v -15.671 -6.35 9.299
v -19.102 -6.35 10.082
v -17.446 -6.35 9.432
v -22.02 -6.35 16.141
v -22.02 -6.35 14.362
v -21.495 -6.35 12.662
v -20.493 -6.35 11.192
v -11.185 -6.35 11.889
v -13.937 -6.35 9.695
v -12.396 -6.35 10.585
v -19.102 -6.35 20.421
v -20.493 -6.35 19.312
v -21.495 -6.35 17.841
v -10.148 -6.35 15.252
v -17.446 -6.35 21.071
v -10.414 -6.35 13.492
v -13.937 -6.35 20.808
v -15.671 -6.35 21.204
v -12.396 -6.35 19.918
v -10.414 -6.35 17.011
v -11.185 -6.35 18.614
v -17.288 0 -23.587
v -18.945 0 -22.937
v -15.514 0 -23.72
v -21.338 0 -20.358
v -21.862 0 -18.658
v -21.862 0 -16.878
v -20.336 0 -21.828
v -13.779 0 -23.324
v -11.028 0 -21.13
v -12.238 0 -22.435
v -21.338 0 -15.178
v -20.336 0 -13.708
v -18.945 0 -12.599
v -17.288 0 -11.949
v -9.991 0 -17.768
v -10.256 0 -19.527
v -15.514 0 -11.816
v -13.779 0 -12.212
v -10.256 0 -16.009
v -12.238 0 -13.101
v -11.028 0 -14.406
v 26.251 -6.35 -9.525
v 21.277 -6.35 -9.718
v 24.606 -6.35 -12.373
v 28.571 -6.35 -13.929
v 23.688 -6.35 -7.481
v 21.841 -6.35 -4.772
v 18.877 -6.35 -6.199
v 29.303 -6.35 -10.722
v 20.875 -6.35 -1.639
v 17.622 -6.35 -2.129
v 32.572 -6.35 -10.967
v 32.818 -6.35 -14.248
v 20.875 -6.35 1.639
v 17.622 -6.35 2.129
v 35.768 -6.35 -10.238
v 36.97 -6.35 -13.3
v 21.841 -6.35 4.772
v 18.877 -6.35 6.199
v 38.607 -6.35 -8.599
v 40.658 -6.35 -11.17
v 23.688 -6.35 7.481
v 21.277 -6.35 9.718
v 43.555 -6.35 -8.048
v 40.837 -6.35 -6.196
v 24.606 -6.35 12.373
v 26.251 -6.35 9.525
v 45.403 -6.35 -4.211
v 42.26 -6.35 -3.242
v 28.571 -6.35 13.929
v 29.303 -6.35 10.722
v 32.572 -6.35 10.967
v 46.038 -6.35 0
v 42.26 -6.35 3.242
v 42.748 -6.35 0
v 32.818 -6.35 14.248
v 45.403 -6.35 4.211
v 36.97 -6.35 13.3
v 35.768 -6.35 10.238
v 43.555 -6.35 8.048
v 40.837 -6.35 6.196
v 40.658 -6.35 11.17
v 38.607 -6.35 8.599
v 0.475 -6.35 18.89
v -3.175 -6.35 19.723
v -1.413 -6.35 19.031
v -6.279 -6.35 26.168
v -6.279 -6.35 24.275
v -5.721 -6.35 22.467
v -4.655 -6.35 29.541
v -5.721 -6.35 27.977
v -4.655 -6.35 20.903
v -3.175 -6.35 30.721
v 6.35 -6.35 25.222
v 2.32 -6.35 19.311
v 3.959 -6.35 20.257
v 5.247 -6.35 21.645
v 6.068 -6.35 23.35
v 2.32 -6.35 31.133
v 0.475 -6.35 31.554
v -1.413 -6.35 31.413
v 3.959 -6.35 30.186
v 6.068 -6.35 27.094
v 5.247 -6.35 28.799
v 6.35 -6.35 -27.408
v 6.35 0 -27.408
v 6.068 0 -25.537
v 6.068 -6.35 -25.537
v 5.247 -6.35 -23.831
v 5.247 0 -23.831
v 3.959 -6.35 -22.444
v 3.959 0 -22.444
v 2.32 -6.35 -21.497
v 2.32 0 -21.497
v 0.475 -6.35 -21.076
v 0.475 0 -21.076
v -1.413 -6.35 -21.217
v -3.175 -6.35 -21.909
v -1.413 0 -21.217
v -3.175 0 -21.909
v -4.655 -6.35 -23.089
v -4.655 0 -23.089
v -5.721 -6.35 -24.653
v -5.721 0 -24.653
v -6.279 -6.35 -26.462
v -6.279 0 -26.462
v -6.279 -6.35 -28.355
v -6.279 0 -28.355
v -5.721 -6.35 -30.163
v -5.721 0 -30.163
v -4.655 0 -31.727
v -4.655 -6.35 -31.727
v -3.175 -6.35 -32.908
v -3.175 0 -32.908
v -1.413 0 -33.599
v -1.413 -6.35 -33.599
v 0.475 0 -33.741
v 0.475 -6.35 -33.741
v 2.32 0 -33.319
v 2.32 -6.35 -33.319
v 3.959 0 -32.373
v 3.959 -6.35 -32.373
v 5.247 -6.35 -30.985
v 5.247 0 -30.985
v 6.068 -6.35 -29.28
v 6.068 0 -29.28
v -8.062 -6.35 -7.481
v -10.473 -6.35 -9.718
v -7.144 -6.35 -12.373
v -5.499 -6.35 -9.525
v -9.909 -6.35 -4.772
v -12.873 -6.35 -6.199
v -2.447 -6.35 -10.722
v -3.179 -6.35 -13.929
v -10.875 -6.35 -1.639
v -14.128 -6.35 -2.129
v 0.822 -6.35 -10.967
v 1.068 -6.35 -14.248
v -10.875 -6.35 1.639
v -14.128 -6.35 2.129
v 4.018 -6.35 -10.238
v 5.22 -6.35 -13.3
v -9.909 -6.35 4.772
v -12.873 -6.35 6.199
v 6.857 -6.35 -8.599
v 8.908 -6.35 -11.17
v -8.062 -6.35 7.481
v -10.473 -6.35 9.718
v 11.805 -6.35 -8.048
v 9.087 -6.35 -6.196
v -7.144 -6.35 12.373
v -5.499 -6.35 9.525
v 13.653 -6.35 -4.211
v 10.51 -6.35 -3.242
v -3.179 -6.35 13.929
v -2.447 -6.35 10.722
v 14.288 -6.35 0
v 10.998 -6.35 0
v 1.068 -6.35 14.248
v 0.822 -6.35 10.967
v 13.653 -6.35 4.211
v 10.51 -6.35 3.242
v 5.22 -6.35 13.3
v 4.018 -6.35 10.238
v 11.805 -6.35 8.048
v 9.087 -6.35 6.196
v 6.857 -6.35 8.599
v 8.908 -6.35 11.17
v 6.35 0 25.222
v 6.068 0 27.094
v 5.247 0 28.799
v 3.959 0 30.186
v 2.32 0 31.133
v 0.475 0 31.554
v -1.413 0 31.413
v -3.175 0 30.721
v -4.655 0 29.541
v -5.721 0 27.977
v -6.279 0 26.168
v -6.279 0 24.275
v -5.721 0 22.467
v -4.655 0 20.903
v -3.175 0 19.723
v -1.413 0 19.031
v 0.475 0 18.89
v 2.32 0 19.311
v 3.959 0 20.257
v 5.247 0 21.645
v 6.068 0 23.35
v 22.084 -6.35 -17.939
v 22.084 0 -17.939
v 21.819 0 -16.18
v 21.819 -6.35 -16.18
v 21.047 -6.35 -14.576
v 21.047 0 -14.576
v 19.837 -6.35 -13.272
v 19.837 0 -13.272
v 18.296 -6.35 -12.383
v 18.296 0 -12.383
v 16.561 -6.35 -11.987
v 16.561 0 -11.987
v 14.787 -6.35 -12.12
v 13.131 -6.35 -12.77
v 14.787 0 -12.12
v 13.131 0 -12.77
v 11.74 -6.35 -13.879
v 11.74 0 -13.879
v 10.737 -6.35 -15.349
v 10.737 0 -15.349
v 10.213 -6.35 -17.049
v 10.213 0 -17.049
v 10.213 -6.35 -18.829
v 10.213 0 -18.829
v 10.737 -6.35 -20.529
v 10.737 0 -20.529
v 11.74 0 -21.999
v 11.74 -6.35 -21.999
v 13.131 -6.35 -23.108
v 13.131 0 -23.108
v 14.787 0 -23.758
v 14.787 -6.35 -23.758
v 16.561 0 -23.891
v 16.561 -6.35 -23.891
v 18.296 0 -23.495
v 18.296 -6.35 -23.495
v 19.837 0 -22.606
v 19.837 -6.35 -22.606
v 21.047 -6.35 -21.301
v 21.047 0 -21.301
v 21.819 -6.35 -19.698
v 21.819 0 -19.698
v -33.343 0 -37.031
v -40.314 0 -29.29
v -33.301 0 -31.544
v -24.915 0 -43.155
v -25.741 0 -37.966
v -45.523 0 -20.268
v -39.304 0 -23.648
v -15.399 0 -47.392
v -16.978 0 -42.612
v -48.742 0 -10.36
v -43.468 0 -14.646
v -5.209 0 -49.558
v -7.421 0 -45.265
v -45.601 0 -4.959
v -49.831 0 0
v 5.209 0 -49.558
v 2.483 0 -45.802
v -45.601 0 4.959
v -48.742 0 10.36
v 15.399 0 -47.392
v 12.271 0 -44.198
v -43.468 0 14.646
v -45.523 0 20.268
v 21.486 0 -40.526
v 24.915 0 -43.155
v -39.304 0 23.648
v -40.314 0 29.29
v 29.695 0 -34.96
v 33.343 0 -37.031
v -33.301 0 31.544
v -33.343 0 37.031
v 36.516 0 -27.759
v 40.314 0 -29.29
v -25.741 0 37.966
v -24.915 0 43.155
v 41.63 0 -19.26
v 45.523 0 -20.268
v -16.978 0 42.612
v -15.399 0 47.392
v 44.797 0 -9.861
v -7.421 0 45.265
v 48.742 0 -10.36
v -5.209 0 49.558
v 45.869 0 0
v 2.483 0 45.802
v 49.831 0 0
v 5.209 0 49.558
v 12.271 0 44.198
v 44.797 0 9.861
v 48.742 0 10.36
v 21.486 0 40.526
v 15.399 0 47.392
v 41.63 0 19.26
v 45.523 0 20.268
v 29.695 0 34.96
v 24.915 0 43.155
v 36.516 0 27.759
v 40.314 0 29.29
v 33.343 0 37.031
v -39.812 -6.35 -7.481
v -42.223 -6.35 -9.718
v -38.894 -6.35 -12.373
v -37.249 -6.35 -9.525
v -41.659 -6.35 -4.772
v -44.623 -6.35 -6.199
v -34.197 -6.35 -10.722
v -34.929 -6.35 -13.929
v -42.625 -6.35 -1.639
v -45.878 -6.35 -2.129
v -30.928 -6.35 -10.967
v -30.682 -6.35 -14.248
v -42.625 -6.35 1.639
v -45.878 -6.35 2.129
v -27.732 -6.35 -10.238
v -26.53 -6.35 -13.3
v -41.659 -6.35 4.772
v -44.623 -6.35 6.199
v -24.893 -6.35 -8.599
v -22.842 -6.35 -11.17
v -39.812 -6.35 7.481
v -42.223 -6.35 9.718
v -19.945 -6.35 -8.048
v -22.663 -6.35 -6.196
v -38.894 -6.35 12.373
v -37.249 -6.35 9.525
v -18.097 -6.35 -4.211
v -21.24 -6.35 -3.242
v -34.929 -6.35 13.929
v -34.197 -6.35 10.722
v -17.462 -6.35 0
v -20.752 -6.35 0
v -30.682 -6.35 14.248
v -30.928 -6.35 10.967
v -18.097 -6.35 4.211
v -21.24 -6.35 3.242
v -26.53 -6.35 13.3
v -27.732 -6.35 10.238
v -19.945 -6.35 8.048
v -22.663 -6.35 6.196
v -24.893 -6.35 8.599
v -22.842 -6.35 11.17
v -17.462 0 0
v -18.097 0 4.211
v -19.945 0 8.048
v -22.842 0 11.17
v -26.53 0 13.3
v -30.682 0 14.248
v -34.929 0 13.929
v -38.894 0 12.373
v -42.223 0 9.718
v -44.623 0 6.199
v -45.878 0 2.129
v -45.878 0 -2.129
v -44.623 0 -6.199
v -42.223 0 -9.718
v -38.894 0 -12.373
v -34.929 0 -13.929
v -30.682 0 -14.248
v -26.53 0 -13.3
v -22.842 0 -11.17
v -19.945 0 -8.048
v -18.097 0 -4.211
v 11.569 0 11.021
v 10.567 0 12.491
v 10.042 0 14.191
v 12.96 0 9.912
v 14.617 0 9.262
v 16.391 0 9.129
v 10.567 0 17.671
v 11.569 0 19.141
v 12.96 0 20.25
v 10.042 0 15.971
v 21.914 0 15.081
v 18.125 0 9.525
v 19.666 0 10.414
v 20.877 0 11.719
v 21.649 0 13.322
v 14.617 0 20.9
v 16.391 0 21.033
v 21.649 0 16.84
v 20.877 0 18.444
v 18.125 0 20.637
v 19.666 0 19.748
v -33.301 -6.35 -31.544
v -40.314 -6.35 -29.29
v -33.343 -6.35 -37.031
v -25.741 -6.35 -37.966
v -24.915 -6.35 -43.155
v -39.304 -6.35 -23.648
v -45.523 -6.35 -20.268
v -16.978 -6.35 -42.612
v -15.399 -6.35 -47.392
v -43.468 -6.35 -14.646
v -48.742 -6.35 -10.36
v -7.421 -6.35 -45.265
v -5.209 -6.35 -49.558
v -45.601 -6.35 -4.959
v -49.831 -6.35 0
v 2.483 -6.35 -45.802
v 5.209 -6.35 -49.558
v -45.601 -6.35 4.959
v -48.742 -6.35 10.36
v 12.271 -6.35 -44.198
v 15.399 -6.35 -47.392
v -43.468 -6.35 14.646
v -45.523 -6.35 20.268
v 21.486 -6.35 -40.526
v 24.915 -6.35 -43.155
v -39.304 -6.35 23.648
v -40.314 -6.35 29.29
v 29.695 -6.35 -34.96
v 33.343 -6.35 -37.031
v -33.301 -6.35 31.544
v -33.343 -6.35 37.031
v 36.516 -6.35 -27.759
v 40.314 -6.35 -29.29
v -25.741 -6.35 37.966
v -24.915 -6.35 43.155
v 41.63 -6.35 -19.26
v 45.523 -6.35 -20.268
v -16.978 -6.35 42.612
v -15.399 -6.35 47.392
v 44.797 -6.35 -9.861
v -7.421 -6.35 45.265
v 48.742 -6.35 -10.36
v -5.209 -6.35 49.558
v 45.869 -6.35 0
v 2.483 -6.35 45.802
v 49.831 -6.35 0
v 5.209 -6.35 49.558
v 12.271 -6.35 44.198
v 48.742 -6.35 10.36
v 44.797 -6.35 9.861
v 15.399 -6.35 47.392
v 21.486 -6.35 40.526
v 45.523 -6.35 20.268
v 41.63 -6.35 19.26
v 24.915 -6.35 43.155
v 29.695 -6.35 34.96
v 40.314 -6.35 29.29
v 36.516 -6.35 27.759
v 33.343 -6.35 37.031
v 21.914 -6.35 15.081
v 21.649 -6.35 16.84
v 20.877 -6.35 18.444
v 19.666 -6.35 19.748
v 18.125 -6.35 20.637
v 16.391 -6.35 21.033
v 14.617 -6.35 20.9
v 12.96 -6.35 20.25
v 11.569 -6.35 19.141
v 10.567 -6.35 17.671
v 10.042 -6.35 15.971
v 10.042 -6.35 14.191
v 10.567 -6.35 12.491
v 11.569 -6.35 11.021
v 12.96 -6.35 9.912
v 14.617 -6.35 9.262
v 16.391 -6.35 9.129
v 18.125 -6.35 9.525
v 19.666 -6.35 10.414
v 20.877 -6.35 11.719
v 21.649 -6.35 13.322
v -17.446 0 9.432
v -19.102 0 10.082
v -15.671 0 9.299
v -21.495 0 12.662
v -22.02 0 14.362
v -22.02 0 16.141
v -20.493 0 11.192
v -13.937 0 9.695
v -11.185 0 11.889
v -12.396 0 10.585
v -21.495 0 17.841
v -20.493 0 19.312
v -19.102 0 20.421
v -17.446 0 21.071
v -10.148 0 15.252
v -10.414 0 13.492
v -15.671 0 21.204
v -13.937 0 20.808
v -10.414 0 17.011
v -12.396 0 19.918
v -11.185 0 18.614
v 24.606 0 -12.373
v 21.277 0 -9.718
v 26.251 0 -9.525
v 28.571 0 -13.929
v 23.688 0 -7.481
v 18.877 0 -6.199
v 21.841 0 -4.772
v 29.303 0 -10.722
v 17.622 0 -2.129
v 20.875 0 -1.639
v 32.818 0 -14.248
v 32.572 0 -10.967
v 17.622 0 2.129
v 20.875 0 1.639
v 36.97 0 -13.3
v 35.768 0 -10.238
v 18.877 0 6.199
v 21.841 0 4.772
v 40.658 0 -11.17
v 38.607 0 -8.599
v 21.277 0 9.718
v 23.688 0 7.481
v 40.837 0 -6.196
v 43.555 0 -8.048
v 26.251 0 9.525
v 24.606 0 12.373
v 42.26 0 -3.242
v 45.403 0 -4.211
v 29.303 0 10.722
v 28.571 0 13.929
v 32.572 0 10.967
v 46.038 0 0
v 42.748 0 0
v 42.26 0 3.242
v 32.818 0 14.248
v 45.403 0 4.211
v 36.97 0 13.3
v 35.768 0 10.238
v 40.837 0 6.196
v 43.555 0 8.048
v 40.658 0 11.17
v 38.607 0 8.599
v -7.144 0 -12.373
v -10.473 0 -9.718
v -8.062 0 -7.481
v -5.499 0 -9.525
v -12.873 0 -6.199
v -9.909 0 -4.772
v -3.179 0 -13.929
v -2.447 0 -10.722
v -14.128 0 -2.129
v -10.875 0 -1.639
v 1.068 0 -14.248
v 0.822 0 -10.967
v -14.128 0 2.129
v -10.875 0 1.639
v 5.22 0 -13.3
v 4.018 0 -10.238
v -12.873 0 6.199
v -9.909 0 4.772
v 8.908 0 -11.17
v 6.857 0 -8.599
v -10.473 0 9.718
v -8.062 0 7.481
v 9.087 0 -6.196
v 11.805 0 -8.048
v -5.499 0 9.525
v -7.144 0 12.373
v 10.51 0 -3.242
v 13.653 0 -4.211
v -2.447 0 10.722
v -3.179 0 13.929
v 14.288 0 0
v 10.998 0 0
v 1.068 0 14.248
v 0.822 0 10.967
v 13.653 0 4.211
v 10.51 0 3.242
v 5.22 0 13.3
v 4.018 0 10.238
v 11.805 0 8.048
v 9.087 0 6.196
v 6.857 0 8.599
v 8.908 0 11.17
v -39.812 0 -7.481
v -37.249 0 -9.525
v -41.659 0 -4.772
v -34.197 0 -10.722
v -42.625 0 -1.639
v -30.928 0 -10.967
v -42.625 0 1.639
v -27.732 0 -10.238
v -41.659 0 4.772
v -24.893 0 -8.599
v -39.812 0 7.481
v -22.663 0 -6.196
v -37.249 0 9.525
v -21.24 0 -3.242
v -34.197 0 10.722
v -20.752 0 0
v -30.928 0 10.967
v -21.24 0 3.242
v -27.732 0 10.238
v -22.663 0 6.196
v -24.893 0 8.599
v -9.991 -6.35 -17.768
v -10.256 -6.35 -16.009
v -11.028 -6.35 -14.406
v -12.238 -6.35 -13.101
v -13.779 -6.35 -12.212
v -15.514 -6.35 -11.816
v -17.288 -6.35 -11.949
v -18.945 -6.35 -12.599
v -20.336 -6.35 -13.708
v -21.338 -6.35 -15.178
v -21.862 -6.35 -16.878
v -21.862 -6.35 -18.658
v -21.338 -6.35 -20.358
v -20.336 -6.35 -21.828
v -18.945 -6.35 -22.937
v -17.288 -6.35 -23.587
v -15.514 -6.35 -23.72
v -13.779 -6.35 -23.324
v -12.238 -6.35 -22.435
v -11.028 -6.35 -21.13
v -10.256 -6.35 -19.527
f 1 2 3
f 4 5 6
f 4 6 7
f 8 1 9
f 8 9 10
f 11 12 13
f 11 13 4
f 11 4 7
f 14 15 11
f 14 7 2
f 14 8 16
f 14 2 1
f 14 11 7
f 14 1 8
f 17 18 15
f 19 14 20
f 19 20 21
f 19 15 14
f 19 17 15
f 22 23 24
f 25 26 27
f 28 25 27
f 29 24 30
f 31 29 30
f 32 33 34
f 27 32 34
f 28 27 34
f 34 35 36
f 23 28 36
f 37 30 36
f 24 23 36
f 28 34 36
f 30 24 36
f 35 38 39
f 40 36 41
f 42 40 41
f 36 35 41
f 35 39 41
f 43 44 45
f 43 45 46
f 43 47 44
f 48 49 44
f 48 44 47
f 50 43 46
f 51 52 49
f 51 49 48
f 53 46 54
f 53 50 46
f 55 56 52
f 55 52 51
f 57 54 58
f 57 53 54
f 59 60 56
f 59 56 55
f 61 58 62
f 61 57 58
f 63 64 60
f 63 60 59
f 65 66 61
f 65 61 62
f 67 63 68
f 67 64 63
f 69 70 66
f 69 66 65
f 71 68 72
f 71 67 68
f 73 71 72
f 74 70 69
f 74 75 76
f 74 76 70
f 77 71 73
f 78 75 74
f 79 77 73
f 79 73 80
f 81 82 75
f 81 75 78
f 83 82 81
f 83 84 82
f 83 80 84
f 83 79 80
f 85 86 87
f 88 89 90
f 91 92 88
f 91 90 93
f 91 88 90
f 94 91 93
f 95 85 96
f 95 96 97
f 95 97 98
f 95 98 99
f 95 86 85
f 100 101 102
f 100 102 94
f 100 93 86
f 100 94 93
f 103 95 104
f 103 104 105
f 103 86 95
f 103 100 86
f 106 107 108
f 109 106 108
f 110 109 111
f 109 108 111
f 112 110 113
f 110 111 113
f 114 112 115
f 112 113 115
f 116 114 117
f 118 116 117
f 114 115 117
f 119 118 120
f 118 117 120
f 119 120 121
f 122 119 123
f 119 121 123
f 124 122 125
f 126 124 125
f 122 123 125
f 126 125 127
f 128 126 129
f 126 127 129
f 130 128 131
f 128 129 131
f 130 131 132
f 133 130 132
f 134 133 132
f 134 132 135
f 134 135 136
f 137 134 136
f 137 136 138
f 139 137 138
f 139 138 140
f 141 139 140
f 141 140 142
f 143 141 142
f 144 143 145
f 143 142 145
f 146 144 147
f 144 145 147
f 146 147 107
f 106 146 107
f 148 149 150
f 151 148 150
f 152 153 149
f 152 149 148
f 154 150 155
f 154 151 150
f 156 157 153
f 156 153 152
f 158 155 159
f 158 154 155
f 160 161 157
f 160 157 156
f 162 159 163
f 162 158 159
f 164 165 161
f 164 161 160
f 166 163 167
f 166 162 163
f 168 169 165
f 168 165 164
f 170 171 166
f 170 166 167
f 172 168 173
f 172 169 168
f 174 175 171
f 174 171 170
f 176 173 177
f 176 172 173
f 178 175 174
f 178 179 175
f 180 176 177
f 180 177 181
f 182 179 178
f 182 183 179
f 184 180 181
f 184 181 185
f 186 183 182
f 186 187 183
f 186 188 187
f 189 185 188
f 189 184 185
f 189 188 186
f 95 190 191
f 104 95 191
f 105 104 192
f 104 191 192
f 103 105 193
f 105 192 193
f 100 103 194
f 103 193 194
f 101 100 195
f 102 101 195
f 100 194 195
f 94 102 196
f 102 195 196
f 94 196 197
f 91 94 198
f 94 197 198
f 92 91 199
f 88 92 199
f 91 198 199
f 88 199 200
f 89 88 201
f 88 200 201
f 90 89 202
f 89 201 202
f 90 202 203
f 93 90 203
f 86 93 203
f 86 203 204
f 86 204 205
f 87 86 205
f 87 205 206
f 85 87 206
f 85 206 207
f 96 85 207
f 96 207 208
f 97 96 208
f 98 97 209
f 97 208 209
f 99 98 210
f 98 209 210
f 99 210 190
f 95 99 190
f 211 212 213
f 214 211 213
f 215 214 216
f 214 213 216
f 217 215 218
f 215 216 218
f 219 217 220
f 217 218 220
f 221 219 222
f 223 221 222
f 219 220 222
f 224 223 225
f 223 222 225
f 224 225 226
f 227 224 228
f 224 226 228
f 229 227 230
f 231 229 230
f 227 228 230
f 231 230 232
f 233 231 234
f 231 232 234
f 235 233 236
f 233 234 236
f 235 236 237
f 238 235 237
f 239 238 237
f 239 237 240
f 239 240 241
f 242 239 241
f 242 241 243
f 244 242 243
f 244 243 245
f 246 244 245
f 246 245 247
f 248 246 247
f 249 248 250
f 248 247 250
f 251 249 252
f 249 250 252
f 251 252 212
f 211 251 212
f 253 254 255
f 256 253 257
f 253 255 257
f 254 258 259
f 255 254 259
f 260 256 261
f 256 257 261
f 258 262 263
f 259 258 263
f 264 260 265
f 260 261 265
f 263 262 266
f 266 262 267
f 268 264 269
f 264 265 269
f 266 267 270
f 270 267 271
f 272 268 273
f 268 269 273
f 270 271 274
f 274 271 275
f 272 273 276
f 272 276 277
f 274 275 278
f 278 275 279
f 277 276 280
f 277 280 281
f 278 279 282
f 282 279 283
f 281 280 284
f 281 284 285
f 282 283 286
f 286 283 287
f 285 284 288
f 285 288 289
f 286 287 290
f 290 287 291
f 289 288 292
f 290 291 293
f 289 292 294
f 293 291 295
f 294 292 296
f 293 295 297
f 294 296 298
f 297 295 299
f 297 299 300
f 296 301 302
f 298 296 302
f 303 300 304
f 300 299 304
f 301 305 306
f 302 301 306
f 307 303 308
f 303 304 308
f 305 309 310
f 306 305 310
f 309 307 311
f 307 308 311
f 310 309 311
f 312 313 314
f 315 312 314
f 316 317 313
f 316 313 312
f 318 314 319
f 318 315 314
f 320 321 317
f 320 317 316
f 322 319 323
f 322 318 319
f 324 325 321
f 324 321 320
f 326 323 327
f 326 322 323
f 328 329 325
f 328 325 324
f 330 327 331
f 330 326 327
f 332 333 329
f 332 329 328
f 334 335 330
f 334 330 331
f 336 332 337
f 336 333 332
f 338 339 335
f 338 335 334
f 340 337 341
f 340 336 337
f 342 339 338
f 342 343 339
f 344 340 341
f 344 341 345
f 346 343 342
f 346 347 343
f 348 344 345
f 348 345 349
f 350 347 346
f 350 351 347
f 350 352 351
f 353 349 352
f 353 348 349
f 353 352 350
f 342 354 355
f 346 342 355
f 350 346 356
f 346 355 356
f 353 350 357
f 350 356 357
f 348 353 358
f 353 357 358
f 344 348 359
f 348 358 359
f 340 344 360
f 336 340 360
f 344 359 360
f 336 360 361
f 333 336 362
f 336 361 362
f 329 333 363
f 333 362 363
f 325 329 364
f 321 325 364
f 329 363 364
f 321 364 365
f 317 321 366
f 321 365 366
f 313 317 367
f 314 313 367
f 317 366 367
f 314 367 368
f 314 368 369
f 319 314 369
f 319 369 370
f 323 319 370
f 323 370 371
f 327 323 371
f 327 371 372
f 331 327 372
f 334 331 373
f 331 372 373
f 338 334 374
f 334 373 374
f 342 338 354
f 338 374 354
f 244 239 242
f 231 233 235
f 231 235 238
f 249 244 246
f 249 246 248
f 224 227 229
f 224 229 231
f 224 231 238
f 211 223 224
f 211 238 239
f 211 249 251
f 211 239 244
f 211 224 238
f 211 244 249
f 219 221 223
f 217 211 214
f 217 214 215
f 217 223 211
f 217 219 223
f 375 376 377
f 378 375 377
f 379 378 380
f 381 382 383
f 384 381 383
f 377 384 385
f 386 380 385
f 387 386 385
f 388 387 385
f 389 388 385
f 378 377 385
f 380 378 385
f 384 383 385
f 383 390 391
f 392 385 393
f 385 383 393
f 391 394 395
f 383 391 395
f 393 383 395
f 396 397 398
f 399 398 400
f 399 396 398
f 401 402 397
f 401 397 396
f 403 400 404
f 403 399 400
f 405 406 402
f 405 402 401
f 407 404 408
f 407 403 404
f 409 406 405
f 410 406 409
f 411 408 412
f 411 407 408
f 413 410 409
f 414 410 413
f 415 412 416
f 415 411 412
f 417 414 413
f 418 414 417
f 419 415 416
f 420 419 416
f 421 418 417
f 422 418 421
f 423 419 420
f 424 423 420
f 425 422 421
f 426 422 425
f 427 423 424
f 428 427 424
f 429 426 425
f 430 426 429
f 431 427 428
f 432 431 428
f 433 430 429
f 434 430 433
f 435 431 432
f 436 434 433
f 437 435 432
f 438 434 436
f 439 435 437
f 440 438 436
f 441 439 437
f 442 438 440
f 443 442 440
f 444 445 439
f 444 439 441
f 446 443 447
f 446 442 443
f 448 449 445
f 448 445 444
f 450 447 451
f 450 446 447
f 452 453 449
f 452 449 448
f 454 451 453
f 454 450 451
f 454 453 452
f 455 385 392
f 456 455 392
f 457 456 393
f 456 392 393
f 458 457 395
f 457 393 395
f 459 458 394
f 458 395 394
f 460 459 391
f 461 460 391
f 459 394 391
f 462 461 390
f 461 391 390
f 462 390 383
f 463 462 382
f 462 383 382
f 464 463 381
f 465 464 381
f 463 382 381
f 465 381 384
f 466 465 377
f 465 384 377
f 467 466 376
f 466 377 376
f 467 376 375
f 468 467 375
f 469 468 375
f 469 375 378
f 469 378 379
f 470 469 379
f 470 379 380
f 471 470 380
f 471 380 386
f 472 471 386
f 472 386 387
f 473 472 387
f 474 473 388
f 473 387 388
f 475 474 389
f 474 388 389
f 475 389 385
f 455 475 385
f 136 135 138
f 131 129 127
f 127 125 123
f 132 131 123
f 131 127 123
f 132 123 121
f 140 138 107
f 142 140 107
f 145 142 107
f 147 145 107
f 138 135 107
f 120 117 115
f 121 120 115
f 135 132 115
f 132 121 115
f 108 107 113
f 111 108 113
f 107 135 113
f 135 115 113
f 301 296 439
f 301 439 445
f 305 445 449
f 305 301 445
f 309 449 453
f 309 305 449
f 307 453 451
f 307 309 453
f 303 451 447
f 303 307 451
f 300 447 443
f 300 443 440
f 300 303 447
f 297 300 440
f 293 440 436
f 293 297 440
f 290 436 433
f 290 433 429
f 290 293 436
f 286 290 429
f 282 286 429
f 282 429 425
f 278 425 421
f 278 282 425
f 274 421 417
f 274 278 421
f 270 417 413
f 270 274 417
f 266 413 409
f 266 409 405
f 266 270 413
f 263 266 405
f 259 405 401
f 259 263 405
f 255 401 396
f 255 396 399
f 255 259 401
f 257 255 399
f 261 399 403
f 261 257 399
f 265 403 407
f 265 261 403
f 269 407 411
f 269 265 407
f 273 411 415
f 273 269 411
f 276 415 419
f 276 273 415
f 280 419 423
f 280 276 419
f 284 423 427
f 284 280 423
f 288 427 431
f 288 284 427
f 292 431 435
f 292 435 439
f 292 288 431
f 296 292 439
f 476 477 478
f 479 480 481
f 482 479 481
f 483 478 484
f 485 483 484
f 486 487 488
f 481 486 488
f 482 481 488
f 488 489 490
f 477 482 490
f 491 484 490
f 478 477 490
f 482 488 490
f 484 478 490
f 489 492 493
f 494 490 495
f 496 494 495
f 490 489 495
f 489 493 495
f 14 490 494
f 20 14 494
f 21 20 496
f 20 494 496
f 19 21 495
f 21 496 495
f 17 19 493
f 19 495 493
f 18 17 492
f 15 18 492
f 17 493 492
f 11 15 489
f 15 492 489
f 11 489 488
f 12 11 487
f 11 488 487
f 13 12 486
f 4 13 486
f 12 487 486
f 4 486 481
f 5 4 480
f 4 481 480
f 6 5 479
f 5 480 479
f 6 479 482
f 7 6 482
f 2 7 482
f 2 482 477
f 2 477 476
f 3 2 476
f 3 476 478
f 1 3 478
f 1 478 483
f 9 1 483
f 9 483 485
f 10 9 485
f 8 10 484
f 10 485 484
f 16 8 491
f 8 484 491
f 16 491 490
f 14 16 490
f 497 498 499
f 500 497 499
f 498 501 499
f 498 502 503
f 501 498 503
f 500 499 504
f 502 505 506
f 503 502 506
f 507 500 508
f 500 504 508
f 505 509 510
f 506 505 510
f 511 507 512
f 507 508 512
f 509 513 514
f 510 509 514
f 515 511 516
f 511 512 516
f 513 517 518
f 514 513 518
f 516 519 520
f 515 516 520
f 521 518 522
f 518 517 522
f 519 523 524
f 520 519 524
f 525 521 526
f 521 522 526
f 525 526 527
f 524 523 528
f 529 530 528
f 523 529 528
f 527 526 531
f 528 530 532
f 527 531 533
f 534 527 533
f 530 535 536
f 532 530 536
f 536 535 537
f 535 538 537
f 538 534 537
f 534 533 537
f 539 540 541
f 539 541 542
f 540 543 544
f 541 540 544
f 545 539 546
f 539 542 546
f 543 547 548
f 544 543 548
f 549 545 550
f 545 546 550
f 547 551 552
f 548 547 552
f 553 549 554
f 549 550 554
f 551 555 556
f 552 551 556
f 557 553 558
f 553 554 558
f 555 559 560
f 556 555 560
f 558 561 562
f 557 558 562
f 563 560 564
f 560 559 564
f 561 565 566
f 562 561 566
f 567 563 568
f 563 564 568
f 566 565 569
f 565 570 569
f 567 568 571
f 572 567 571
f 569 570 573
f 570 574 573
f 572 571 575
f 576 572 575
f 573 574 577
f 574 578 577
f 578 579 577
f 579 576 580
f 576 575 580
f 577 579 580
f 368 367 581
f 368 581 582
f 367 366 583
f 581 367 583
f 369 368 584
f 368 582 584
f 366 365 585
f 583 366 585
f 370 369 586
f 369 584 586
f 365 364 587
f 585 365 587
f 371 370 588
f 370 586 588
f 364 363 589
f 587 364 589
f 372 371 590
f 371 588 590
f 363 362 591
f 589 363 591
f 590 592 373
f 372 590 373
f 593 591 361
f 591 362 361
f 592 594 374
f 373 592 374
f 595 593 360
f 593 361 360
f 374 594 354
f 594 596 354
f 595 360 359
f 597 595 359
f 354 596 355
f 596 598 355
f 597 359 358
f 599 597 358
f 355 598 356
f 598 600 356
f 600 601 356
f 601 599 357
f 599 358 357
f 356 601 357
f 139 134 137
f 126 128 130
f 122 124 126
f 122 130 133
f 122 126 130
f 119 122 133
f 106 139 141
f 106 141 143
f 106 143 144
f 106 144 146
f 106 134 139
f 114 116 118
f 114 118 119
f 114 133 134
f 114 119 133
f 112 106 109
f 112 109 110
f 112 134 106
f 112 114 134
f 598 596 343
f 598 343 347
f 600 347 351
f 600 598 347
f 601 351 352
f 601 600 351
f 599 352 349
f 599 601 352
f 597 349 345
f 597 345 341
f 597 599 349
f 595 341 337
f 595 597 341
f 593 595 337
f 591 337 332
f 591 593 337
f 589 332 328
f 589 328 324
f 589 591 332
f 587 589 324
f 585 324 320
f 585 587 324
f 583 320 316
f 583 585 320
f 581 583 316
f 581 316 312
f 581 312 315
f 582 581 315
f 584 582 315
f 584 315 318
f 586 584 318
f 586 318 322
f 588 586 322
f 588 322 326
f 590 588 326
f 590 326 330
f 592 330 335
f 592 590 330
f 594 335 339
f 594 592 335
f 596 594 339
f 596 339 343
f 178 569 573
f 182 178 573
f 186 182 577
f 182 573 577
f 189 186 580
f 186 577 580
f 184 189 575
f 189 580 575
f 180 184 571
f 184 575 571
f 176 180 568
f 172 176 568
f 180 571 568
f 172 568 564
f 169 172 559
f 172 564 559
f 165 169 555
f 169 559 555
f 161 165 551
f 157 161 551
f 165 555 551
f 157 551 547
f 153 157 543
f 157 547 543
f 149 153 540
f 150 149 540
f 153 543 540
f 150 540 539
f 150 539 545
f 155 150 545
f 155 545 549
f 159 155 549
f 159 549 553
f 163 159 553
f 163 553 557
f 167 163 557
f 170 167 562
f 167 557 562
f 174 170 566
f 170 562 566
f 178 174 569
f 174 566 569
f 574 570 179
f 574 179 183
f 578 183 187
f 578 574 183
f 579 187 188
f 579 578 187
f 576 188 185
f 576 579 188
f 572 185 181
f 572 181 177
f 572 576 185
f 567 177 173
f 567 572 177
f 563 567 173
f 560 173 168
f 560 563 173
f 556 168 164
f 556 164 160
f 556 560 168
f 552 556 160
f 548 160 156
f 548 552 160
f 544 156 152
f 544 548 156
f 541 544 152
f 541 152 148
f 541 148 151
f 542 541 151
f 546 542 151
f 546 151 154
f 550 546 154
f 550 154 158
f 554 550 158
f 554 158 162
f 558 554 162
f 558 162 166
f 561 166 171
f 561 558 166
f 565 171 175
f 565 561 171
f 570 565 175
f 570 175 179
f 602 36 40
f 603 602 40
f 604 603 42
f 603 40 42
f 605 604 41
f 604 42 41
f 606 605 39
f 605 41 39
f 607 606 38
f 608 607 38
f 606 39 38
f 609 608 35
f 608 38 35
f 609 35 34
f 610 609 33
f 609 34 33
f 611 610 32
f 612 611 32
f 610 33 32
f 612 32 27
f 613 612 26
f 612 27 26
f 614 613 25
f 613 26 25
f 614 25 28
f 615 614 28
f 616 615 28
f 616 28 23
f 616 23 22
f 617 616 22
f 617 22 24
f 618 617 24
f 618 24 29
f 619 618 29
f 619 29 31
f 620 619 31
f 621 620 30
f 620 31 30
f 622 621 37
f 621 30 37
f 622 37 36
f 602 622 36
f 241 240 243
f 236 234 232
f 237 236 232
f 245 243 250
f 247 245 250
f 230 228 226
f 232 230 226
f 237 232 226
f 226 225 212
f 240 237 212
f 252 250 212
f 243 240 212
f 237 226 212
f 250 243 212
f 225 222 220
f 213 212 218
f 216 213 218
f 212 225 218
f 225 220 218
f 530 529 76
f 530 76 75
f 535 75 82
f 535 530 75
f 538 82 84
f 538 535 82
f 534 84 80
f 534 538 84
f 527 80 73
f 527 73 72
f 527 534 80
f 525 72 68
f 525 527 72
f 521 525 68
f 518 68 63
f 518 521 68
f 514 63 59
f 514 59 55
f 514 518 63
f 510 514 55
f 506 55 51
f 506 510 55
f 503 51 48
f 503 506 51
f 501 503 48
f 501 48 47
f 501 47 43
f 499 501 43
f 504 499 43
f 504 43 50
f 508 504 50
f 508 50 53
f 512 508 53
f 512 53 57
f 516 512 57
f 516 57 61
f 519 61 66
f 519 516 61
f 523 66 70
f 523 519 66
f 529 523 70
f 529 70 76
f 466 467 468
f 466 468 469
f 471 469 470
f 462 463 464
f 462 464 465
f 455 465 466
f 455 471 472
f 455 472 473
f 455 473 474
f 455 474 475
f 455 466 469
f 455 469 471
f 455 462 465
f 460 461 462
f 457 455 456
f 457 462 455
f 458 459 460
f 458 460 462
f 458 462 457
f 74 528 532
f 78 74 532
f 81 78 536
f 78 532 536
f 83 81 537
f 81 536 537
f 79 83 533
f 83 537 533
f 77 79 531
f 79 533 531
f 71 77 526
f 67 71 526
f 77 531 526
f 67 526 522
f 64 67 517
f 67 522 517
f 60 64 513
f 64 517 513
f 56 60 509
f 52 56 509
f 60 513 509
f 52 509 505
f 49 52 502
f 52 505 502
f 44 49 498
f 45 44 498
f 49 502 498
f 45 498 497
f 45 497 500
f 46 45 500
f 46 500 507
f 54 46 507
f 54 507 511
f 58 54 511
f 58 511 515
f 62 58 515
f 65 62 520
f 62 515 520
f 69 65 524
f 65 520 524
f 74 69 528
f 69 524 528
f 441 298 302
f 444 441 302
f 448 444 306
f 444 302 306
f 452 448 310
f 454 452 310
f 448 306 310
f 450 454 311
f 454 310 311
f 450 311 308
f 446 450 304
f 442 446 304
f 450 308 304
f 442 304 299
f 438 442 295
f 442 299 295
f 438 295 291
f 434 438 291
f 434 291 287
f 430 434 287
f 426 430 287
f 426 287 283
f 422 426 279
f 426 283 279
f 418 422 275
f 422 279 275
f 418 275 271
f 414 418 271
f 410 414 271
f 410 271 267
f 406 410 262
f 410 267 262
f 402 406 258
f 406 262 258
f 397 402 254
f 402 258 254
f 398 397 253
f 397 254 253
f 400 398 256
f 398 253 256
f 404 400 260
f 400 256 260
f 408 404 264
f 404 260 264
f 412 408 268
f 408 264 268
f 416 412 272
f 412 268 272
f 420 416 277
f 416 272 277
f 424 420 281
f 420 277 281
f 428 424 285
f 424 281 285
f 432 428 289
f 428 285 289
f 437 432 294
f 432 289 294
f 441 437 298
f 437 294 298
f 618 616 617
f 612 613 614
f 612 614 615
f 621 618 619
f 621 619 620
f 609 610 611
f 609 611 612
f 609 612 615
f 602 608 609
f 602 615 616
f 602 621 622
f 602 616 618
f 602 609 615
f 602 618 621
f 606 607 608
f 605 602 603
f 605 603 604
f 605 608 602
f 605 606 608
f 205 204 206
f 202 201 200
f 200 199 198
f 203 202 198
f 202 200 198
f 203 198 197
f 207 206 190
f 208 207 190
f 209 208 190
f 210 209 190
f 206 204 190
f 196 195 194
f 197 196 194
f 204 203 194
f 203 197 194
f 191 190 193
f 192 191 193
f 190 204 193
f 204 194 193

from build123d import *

# Parameters (mm, degrees)
F0_R     = 14.2875
F0_R_2   = 10.9982
F3_DEPTH = 6.35
F1_R     = 49.8306720945
F1_R_2   = 45.8694924296
F2_R     = 5.969
F6_DEPTH = 6.35
F4_R     = 6.35


with BuildPart() as f3:
    # F0 (on Front) → F3 (new body)
    with BuildSketch(Plane.XZ):
        Circle(F0_R)
        Circle(F0_R_2, mode=Mode.SUBTRACT)
    extrude(amount=F3_DEPTH)


with BuildPart() as f3b:
    # F0 (on Front) → F3, piece 2 (new body)
    with BuildSketch(Plane.XZ):
        with Locations((31.75, 0)):
            Circle(F0_R)
        with Locations((31.75, 0)):
            Circle(F0_R_2, mode=Mode.SUBTRACT)
    extrude(amount=F3_DEPTH)


with BuildPart() as f3c:
    # F0 (on Front) → F3, piece 3 (new body)
    with BuildSketch(Plane.XZ):
        with Locations((-31.75, 0)):
            Circle(F0_R)
        with Locations((-31.75, 0)):
            Circle(F0_R_2, mode=Mode.SUBTRACT)
    extrude(amount=F3_DEPTH)


with BuildPart() as f3d:
    # F1 (on Front) → F3, piece 4 (new body)
    with BuildSketch(Plane.XZ):
        Circle(F1_R)
        Circle(F1_R_2, mode=Mode.SUBTRACT)
    extrude(amount=F3_DEPTH)


with BuildPart() as f6:
    # F2 (on face) → F6 (new body)
    with BuildSketch(Plane.XZ):
        with Locations((15.9447327793, 15.0810879356)):
            Circle(F2_R)
    extrude(amount=F6_DEPTH)


with BuildPart() as f6b:
    # F2 (on face) → F6, piece 2 (new body)
    with BuildSketch(Plane.XZ):
        with Locations((-16.1173143299, 15.2516302353)):
            Circle(F2_R)
    extrude(amount=F6_DEPTH)


with BuildPart() as f6c:
    # F2 (on face) → F6, piece 3 (new body)
    with BuildSketch(Plane.XZ):
        with Locations((-15.9600784864, -17.7679953969)):
            Circle(F2_R)
    extrude(amount=F6_DEPTH)


with BuildPart() as f6d:
    # F2 (on face) → F6, piece 4 (new body)
    with BuildSketch(Plane.XZ):
        with Locations((16.1152769371, -17.9389120644)):
            Circle(F2_R)
    extrude(amount=F6_DEPTH)


with BuildPart() as f6e:
    # F4 (on face) → F6, piece 5 (new body)
    with BuildSketch(Plane.XZ):
        with Locations((0, 25.2218518232)):
            Circle(F4_R)
    extrude(amount=F6_DEPTH)


with BuildPart() as f6f:
    # F4 (on face) → F6, piece 6 (new body)
    with BuildSketch(Plane.XZ):
        with Locations((0, -27.4082663913)):
            Circle(F4_R)
    extrude(amount=F6_DEPTH)


solid = Compound([f3.part, f3b.part, f3c.part, f3d.part, f6.part, f6b.part, f6c.part, f6d.part, f6e.part, f6f.part])
